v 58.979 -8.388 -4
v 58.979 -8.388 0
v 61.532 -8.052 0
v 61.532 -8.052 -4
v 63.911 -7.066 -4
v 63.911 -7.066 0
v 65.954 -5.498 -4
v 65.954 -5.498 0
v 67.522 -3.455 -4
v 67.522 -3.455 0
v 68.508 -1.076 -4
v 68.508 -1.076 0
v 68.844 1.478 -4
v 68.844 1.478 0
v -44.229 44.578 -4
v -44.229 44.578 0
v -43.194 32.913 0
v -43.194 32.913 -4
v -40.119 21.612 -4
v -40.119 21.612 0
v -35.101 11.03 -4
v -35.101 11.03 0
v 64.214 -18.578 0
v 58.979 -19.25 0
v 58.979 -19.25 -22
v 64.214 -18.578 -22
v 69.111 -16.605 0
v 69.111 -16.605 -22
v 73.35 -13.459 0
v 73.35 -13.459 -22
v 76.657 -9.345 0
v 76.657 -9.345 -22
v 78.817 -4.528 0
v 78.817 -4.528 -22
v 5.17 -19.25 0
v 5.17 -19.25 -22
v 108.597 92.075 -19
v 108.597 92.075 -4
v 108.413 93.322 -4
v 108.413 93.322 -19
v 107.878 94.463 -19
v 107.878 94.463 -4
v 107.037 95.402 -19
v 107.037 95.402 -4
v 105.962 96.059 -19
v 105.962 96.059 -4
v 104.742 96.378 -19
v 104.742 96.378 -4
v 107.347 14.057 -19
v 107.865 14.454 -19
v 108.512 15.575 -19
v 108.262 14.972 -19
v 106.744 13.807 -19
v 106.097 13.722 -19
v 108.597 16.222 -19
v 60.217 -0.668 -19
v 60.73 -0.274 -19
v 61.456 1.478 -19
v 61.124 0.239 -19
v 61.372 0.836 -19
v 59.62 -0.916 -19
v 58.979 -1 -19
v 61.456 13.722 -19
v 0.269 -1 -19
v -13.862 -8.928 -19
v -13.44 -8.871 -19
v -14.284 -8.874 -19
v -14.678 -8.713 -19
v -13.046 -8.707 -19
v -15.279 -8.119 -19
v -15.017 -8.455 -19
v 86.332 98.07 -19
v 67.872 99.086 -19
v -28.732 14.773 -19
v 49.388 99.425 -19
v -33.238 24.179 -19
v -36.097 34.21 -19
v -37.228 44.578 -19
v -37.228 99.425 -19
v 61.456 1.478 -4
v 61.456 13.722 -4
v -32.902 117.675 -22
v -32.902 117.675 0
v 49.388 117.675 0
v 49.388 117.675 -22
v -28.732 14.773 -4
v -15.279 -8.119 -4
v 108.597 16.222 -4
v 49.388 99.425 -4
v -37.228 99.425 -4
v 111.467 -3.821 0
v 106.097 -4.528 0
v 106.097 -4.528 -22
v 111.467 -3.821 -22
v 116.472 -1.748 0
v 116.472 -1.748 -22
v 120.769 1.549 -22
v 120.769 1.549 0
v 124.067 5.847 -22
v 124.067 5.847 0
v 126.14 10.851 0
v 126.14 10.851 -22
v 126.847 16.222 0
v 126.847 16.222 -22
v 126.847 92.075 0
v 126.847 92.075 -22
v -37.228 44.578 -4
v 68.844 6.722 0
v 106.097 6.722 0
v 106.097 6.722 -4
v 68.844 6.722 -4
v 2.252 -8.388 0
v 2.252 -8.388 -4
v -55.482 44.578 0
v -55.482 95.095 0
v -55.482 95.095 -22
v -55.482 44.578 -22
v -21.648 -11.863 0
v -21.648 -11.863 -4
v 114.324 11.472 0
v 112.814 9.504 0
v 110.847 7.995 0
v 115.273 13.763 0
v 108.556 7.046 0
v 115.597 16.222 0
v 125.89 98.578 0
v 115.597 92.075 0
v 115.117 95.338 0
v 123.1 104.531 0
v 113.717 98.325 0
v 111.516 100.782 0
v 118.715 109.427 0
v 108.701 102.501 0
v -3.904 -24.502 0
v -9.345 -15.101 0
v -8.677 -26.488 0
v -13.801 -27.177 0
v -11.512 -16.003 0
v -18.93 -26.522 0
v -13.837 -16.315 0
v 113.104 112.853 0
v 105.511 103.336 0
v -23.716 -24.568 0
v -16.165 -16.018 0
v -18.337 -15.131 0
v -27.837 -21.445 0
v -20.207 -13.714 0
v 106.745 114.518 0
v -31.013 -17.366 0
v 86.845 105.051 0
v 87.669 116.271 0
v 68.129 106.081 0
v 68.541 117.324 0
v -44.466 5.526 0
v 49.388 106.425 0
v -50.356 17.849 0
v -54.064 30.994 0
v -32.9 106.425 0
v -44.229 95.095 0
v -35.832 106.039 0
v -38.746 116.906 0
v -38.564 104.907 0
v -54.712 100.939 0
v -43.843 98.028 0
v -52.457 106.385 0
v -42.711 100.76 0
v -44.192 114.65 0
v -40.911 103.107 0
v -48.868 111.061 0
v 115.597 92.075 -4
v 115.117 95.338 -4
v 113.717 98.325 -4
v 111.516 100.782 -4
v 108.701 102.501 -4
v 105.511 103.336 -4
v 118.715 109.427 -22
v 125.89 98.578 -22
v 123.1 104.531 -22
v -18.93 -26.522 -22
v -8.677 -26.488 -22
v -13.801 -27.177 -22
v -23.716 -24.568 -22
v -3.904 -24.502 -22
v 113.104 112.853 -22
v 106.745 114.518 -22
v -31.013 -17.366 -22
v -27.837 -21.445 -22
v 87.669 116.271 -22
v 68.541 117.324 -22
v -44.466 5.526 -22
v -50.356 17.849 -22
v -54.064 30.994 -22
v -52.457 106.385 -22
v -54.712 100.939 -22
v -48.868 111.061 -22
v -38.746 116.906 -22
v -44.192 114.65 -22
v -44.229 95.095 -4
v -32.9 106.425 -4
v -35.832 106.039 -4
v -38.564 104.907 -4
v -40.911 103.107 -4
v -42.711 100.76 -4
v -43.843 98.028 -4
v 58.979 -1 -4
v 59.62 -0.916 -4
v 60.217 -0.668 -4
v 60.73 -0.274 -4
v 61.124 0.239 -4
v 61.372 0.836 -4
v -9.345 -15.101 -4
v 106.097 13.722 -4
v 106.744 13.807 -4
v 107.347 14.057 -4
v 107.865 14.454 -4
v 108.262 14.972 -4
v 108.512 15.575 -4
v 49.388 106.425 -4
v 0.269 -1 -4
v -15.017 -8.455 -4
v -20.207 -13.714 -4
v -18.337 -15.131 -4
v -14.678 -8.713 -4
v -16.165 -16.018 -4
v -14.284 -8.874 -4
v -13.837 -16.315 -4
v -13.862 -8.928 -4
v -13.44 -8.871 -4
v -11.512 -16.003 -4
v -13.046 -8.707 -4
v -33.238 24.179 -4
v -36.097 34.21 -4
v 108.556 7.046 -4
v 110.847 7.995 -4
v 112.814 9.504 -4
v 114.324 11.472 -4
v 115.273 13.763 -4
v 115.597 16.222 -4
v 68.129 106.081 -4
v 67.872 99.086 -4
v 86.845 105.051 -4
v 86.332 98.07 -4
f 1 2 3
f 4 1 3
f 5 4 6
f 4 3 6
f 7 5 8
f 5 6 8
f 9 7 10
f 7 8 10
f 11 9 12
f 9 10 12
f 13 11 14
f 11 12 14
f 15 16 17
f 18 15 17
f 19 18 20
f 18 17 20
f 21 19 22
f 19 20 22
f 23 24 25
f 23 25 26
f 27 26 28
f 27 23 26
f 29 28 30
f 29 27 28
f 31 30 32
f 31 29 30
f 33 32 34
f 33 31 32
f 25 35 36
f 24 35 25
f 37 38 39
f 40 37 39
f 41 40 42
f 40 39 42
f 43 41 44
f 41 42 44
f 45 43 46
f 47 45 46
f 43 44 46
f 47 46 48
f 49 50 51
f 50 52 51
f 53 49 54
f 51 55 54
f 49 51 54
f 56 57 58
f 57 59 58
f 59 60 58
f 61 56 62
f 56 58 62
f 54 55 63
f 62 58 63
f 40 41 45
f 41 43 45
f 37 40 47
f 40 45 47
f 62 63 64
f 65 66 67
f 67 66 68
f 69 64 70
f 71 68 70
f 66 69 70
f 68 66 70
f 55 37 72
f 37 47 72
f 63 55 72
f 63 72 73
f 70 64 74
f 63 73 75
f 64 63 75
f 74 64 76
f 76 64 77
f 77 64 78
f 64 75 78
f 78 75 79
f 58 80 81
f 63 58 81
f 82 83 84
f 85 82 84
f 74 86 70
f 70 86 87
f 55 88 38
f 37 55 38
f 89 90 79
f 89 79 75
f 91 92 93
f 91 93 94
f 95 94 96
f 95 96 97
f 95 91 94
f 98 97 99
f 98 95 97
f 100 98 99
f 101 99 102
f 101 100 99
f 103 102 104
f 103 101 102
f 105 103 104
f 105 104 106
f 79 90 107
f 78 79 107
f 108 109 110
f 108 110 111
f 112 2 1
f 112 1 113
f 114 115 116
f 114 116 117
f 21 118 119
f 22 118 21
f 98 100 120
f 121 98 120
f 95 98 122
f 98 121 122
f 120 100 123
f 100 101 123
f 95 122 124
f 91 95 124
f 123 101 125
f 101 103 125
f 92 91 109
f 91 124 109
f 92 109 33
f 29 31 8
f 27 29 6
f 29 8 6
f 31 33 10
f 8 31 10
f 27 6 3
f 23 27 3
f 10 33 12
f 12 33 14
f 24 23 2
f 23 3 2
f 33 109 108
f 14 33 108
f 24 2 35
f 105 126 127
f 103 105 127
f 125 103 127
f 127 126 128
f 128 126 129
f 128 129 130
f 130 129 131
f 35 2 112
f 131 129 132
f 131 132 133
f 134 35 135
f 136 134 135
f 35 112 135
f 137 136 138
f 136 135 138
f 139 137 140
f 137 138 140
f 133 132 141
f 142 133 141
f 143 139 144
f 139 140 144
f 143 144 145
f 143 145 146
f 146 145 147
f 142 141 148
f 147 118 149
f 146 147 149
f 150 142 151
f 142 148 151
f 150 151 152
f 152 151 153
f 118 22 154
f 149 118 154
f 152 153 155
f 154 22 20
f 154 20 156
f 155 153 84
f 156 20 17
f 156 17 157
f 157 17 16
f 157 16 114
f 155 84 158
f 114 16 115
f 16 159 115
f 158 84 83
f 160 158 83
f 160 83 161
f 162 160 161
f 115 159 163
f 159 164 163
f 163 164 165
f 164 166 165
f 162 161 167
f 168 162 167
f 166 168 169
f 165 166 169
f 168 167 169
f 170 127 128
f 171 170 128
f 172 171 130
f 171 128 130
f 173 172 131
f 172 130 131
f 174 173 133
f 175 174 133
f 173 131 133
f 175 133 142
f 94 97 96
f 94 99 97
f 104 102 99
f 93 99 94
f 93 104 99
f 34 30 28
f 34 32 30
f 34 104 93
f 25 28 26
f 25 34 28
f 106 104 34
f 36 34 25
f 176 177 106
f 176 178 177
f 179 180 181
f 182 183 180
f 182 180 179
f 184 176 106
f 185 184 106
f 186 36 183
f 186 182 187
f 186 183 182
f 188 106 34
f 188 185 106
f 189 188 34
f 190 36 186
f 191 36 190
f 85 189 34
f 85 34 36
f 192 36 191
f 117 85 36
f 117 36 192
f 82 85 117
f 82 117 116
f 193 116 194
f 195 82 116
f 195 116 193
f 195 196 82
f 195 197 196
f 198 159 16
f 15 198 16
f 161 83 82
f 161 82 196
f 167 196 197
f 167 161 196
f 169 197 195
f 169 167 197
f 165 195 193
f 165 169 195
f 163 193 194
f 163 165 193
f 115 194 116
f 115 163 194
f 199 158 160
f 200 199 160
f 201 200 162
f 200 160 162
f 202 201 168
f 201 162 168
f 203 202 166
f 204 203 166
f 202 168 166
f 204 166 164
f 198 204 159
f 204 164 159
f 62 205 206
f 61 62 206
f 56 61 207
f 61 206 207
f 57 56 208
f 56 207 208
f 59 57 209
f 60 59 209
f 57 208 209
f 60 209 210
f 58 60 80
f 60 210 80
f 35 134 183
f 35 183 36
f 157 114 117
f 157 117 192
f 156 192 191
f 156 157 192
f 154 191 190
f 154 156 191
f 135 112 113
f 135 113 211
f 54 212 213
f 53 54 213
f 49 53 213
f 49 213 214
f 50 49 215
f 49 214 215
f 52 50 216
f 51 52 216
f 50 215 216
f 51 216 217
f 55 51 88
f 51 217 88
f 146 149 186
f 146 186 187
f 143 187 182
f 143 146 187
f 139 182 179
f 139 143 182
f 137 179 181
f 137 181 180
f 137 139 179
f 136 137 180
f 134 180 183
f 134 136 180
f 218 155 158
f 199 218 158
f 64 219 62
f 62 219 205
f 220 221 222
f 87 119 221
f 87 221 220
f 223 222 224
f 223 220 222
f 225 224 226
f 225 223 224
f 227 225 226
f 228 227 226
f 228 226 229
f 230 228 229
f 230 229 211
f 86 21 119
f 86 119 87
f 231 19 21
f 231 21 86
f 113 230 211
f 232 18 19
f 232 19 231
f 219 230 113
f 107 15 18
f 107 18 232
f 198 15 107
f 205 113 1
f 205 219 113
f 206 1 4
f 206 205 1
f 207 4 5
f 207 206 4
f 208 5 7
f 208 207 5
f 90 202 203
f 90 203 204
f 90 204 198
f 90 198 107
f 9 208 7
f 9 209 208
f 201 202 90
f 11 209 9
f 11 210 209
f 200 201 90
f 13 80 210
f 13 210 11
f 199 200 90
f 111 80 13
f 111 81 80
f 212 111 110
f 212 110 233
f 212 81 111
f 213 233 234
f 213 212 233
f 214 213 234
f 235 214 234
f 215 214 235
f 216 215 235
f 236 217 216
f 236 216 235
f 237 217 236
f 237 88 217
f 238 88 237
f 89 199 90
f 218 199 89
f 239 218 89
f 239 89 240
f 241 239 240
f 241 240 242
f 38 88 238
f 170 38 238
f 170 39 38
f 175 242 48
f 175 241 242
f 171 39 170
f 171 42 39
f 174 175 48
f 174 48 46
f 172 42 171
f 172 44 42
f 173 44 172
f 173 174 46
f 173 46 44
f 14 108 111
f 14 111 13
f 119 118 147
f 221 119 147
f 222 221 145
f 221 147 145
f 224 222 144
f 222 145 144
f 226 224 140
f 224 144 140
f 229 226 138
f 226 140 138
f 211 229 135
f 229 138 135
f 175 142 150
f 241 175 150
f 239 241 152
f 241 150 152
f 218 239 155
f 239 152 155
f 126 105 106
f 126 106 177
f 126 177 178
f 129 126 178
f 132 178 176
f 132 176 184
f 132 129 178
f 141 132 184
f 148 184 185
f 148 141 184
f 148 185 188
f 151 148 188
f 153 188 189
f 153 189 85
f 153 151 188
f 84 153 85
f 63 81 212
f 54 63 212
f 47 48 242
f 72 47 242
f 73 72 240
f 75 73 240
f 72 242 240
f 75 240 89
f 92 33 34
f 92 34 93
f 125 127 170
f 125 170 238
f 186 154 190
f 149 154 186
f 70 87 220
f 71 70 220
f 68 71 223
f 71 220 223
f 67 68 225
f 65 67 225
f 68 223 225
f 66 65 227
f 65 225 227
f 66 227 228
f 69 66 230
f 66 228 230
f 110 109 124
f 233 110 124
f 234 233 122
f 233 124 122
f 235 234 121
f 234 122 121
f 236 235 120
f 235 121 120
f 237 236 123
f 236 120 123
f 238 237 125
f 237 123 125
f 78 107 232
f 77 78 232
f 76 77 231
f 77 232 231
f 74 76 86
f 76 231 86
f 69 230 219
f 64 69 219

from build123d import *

# Parameters (mm, degrees)
PAD_DEPTH       = 22
POCKET_DEPTH    = 4
POCKET001_DEPTH = 19


with BuildPart() as part:
    # Sketch009 → Pad (new body)
    with BuildSketch(Plane.XY):
        with BuildLine():
            Line((-32.90217, 117.6749), (49.38771, 117.6749))
            ThreePointArc((106.745131, 114.51814), (78.109822, 116.885113), (49.38771, 117.6749))
            ThreePointArc((126.84683, 92.07491), (121.086688, 107.139578), (106.745131, 114.51814))
            Line((126.84683, 16.22193), (126.84683, 92.07491))
            ThreePointArc((106.09683, -4.52807), (120.769296, 1.549464), (126.84683, 16.22193))
            Line((78.817048, -4.52807), (106.09683, -4.52807))
            ThreePointArc((58.97856, -19.25), (71.330694, -15.167467), (78.817048, -4.52807))
            Line((5.169501, -19.25), (58.97856, -19.25))
            Line((-3.90385, -24.50197), (5.169501, -19.25))
            ThreePointArc((-31.01326, -17.365921), (-18.929599, -26.522348), (-3.90385, -24.50197))
            Line((-44.46621, 5.526299), (-31.01326, -17.365921))
            ThreePointArc((-55.481775, 44.57846), (-52.490743, 24.342472), (-44.46621, 5.526299))
            Line((-55.481775, 95.095295), (-55.481775, 44.57846))
            ThreePointArc((-32.90217, 117.6749), (-48.868362, 111.061487), (-55.481775, 95.095295))
        make_face()
    extrude(amount=-PAD_DEPTH)

    # Sketch010 → Pocket (cut)
    with BuildSketch(Plane.XY):
        with BuildLine():
            Line((49.38771, 106.4249), (-32.899678, 106.4249))
            ThreePointArc((-32.899678, 106.4249), (-40.910919, 103.106535), (-44.229283, 95.095295))
            Line((-44.229283, 95.095295), (-44.229283, 44.57846))
            ThreePointArc((-44.229283, 44.57846), (-41.906554, 27.194286), (-35.101321, 11.029714))
            Line((-21.648371, -11.862506), (-35.101321, 11.029714))
            ThreePointArc((-21.648371, -11.862506), (-16.164503, -16.017921), (-9.345444, -15.101023))
            Line((2.252489, -8.387738), (-9.345444, -15.101023))
            Line((58.97856, -8.387738), (2.252489, -8.387738))
            ThreePointArc((58.97856, -8.387738), (65.954415, -5.498245), (68.843908, 1.47761))
            Line((68.843908, 6.72193), (68.843908, 1.47761))
            Line((106.09683, 6.72193), (68.843908, 6.72193))
            ThreePointArc((106.09683, 6.72193), (112.814344, 9.504416), (115.59683, 16.22193))
            Line((115.59683, 92.07491), (115.59683, 16.22193))
            ThreePointArc((115.59683, 92.07491), (112.706605, 99.633799), (105.510546, 103.336087))
            ThreePointArc((105.510546, 103.336087), (77.491595, 105.652113), (49.38771, 106.4249))
        make_face()
    extrude(amount=-POCKET_DEPTH, mode=Mode.SUBTRACT)

    # Sketch011 → Pocket001 (cut)
    with BuildSketch(Plane.XY):
        with BuildLine():
            Line((-37.227702, 99.4249), (49.38771, 99.4249))
            ThreePointArc((104.74236, 96.378365), (77.106921, 98.66269), (49.38771, 99.4249))
            ThreePointArc((108.59683, 92.07491), (107.492332, 94.963537), (104.74236, 96.378365))
            Line((108.59683, 16.22193), (108.59683, 92.07491))
            ThreePointArc((106.09683, 13.72193), (107.864597, 14.454163), (108.59683, 16.22193))
            Line((61.45617, 13.72193), (106.09683, 13.72193))
            Line((61.45617, 1.47761), (61.45617, 13.72193))
            ThreePointArc((58.97856, -1), (60.730495, -0.274325), (61.45617, 1.47761))
            Line((0.268545, -1), (58.97856, -1))
            Line((-13.046428, -8.707168), (0.268545, -1))
            ThreePointArc((-15.279039, -8.119475), (-14.283882, -8.873557), (-13.046428, -8.707168))
            Line((-28.731989, 14.772745), (-15.279039, -8.119475))
            ThreePointArc((-37.227702, 44.57846), (-34.879927, 29.13401), (-28.731989, 14.772745))
            Line((-37.227702, 99.4249), (-37.227702, 44.57846))
        make_face()
    extrude(amount=-POCKET001_DEPTH, mode=Mode.SUBTRACT)


solid = part.part
